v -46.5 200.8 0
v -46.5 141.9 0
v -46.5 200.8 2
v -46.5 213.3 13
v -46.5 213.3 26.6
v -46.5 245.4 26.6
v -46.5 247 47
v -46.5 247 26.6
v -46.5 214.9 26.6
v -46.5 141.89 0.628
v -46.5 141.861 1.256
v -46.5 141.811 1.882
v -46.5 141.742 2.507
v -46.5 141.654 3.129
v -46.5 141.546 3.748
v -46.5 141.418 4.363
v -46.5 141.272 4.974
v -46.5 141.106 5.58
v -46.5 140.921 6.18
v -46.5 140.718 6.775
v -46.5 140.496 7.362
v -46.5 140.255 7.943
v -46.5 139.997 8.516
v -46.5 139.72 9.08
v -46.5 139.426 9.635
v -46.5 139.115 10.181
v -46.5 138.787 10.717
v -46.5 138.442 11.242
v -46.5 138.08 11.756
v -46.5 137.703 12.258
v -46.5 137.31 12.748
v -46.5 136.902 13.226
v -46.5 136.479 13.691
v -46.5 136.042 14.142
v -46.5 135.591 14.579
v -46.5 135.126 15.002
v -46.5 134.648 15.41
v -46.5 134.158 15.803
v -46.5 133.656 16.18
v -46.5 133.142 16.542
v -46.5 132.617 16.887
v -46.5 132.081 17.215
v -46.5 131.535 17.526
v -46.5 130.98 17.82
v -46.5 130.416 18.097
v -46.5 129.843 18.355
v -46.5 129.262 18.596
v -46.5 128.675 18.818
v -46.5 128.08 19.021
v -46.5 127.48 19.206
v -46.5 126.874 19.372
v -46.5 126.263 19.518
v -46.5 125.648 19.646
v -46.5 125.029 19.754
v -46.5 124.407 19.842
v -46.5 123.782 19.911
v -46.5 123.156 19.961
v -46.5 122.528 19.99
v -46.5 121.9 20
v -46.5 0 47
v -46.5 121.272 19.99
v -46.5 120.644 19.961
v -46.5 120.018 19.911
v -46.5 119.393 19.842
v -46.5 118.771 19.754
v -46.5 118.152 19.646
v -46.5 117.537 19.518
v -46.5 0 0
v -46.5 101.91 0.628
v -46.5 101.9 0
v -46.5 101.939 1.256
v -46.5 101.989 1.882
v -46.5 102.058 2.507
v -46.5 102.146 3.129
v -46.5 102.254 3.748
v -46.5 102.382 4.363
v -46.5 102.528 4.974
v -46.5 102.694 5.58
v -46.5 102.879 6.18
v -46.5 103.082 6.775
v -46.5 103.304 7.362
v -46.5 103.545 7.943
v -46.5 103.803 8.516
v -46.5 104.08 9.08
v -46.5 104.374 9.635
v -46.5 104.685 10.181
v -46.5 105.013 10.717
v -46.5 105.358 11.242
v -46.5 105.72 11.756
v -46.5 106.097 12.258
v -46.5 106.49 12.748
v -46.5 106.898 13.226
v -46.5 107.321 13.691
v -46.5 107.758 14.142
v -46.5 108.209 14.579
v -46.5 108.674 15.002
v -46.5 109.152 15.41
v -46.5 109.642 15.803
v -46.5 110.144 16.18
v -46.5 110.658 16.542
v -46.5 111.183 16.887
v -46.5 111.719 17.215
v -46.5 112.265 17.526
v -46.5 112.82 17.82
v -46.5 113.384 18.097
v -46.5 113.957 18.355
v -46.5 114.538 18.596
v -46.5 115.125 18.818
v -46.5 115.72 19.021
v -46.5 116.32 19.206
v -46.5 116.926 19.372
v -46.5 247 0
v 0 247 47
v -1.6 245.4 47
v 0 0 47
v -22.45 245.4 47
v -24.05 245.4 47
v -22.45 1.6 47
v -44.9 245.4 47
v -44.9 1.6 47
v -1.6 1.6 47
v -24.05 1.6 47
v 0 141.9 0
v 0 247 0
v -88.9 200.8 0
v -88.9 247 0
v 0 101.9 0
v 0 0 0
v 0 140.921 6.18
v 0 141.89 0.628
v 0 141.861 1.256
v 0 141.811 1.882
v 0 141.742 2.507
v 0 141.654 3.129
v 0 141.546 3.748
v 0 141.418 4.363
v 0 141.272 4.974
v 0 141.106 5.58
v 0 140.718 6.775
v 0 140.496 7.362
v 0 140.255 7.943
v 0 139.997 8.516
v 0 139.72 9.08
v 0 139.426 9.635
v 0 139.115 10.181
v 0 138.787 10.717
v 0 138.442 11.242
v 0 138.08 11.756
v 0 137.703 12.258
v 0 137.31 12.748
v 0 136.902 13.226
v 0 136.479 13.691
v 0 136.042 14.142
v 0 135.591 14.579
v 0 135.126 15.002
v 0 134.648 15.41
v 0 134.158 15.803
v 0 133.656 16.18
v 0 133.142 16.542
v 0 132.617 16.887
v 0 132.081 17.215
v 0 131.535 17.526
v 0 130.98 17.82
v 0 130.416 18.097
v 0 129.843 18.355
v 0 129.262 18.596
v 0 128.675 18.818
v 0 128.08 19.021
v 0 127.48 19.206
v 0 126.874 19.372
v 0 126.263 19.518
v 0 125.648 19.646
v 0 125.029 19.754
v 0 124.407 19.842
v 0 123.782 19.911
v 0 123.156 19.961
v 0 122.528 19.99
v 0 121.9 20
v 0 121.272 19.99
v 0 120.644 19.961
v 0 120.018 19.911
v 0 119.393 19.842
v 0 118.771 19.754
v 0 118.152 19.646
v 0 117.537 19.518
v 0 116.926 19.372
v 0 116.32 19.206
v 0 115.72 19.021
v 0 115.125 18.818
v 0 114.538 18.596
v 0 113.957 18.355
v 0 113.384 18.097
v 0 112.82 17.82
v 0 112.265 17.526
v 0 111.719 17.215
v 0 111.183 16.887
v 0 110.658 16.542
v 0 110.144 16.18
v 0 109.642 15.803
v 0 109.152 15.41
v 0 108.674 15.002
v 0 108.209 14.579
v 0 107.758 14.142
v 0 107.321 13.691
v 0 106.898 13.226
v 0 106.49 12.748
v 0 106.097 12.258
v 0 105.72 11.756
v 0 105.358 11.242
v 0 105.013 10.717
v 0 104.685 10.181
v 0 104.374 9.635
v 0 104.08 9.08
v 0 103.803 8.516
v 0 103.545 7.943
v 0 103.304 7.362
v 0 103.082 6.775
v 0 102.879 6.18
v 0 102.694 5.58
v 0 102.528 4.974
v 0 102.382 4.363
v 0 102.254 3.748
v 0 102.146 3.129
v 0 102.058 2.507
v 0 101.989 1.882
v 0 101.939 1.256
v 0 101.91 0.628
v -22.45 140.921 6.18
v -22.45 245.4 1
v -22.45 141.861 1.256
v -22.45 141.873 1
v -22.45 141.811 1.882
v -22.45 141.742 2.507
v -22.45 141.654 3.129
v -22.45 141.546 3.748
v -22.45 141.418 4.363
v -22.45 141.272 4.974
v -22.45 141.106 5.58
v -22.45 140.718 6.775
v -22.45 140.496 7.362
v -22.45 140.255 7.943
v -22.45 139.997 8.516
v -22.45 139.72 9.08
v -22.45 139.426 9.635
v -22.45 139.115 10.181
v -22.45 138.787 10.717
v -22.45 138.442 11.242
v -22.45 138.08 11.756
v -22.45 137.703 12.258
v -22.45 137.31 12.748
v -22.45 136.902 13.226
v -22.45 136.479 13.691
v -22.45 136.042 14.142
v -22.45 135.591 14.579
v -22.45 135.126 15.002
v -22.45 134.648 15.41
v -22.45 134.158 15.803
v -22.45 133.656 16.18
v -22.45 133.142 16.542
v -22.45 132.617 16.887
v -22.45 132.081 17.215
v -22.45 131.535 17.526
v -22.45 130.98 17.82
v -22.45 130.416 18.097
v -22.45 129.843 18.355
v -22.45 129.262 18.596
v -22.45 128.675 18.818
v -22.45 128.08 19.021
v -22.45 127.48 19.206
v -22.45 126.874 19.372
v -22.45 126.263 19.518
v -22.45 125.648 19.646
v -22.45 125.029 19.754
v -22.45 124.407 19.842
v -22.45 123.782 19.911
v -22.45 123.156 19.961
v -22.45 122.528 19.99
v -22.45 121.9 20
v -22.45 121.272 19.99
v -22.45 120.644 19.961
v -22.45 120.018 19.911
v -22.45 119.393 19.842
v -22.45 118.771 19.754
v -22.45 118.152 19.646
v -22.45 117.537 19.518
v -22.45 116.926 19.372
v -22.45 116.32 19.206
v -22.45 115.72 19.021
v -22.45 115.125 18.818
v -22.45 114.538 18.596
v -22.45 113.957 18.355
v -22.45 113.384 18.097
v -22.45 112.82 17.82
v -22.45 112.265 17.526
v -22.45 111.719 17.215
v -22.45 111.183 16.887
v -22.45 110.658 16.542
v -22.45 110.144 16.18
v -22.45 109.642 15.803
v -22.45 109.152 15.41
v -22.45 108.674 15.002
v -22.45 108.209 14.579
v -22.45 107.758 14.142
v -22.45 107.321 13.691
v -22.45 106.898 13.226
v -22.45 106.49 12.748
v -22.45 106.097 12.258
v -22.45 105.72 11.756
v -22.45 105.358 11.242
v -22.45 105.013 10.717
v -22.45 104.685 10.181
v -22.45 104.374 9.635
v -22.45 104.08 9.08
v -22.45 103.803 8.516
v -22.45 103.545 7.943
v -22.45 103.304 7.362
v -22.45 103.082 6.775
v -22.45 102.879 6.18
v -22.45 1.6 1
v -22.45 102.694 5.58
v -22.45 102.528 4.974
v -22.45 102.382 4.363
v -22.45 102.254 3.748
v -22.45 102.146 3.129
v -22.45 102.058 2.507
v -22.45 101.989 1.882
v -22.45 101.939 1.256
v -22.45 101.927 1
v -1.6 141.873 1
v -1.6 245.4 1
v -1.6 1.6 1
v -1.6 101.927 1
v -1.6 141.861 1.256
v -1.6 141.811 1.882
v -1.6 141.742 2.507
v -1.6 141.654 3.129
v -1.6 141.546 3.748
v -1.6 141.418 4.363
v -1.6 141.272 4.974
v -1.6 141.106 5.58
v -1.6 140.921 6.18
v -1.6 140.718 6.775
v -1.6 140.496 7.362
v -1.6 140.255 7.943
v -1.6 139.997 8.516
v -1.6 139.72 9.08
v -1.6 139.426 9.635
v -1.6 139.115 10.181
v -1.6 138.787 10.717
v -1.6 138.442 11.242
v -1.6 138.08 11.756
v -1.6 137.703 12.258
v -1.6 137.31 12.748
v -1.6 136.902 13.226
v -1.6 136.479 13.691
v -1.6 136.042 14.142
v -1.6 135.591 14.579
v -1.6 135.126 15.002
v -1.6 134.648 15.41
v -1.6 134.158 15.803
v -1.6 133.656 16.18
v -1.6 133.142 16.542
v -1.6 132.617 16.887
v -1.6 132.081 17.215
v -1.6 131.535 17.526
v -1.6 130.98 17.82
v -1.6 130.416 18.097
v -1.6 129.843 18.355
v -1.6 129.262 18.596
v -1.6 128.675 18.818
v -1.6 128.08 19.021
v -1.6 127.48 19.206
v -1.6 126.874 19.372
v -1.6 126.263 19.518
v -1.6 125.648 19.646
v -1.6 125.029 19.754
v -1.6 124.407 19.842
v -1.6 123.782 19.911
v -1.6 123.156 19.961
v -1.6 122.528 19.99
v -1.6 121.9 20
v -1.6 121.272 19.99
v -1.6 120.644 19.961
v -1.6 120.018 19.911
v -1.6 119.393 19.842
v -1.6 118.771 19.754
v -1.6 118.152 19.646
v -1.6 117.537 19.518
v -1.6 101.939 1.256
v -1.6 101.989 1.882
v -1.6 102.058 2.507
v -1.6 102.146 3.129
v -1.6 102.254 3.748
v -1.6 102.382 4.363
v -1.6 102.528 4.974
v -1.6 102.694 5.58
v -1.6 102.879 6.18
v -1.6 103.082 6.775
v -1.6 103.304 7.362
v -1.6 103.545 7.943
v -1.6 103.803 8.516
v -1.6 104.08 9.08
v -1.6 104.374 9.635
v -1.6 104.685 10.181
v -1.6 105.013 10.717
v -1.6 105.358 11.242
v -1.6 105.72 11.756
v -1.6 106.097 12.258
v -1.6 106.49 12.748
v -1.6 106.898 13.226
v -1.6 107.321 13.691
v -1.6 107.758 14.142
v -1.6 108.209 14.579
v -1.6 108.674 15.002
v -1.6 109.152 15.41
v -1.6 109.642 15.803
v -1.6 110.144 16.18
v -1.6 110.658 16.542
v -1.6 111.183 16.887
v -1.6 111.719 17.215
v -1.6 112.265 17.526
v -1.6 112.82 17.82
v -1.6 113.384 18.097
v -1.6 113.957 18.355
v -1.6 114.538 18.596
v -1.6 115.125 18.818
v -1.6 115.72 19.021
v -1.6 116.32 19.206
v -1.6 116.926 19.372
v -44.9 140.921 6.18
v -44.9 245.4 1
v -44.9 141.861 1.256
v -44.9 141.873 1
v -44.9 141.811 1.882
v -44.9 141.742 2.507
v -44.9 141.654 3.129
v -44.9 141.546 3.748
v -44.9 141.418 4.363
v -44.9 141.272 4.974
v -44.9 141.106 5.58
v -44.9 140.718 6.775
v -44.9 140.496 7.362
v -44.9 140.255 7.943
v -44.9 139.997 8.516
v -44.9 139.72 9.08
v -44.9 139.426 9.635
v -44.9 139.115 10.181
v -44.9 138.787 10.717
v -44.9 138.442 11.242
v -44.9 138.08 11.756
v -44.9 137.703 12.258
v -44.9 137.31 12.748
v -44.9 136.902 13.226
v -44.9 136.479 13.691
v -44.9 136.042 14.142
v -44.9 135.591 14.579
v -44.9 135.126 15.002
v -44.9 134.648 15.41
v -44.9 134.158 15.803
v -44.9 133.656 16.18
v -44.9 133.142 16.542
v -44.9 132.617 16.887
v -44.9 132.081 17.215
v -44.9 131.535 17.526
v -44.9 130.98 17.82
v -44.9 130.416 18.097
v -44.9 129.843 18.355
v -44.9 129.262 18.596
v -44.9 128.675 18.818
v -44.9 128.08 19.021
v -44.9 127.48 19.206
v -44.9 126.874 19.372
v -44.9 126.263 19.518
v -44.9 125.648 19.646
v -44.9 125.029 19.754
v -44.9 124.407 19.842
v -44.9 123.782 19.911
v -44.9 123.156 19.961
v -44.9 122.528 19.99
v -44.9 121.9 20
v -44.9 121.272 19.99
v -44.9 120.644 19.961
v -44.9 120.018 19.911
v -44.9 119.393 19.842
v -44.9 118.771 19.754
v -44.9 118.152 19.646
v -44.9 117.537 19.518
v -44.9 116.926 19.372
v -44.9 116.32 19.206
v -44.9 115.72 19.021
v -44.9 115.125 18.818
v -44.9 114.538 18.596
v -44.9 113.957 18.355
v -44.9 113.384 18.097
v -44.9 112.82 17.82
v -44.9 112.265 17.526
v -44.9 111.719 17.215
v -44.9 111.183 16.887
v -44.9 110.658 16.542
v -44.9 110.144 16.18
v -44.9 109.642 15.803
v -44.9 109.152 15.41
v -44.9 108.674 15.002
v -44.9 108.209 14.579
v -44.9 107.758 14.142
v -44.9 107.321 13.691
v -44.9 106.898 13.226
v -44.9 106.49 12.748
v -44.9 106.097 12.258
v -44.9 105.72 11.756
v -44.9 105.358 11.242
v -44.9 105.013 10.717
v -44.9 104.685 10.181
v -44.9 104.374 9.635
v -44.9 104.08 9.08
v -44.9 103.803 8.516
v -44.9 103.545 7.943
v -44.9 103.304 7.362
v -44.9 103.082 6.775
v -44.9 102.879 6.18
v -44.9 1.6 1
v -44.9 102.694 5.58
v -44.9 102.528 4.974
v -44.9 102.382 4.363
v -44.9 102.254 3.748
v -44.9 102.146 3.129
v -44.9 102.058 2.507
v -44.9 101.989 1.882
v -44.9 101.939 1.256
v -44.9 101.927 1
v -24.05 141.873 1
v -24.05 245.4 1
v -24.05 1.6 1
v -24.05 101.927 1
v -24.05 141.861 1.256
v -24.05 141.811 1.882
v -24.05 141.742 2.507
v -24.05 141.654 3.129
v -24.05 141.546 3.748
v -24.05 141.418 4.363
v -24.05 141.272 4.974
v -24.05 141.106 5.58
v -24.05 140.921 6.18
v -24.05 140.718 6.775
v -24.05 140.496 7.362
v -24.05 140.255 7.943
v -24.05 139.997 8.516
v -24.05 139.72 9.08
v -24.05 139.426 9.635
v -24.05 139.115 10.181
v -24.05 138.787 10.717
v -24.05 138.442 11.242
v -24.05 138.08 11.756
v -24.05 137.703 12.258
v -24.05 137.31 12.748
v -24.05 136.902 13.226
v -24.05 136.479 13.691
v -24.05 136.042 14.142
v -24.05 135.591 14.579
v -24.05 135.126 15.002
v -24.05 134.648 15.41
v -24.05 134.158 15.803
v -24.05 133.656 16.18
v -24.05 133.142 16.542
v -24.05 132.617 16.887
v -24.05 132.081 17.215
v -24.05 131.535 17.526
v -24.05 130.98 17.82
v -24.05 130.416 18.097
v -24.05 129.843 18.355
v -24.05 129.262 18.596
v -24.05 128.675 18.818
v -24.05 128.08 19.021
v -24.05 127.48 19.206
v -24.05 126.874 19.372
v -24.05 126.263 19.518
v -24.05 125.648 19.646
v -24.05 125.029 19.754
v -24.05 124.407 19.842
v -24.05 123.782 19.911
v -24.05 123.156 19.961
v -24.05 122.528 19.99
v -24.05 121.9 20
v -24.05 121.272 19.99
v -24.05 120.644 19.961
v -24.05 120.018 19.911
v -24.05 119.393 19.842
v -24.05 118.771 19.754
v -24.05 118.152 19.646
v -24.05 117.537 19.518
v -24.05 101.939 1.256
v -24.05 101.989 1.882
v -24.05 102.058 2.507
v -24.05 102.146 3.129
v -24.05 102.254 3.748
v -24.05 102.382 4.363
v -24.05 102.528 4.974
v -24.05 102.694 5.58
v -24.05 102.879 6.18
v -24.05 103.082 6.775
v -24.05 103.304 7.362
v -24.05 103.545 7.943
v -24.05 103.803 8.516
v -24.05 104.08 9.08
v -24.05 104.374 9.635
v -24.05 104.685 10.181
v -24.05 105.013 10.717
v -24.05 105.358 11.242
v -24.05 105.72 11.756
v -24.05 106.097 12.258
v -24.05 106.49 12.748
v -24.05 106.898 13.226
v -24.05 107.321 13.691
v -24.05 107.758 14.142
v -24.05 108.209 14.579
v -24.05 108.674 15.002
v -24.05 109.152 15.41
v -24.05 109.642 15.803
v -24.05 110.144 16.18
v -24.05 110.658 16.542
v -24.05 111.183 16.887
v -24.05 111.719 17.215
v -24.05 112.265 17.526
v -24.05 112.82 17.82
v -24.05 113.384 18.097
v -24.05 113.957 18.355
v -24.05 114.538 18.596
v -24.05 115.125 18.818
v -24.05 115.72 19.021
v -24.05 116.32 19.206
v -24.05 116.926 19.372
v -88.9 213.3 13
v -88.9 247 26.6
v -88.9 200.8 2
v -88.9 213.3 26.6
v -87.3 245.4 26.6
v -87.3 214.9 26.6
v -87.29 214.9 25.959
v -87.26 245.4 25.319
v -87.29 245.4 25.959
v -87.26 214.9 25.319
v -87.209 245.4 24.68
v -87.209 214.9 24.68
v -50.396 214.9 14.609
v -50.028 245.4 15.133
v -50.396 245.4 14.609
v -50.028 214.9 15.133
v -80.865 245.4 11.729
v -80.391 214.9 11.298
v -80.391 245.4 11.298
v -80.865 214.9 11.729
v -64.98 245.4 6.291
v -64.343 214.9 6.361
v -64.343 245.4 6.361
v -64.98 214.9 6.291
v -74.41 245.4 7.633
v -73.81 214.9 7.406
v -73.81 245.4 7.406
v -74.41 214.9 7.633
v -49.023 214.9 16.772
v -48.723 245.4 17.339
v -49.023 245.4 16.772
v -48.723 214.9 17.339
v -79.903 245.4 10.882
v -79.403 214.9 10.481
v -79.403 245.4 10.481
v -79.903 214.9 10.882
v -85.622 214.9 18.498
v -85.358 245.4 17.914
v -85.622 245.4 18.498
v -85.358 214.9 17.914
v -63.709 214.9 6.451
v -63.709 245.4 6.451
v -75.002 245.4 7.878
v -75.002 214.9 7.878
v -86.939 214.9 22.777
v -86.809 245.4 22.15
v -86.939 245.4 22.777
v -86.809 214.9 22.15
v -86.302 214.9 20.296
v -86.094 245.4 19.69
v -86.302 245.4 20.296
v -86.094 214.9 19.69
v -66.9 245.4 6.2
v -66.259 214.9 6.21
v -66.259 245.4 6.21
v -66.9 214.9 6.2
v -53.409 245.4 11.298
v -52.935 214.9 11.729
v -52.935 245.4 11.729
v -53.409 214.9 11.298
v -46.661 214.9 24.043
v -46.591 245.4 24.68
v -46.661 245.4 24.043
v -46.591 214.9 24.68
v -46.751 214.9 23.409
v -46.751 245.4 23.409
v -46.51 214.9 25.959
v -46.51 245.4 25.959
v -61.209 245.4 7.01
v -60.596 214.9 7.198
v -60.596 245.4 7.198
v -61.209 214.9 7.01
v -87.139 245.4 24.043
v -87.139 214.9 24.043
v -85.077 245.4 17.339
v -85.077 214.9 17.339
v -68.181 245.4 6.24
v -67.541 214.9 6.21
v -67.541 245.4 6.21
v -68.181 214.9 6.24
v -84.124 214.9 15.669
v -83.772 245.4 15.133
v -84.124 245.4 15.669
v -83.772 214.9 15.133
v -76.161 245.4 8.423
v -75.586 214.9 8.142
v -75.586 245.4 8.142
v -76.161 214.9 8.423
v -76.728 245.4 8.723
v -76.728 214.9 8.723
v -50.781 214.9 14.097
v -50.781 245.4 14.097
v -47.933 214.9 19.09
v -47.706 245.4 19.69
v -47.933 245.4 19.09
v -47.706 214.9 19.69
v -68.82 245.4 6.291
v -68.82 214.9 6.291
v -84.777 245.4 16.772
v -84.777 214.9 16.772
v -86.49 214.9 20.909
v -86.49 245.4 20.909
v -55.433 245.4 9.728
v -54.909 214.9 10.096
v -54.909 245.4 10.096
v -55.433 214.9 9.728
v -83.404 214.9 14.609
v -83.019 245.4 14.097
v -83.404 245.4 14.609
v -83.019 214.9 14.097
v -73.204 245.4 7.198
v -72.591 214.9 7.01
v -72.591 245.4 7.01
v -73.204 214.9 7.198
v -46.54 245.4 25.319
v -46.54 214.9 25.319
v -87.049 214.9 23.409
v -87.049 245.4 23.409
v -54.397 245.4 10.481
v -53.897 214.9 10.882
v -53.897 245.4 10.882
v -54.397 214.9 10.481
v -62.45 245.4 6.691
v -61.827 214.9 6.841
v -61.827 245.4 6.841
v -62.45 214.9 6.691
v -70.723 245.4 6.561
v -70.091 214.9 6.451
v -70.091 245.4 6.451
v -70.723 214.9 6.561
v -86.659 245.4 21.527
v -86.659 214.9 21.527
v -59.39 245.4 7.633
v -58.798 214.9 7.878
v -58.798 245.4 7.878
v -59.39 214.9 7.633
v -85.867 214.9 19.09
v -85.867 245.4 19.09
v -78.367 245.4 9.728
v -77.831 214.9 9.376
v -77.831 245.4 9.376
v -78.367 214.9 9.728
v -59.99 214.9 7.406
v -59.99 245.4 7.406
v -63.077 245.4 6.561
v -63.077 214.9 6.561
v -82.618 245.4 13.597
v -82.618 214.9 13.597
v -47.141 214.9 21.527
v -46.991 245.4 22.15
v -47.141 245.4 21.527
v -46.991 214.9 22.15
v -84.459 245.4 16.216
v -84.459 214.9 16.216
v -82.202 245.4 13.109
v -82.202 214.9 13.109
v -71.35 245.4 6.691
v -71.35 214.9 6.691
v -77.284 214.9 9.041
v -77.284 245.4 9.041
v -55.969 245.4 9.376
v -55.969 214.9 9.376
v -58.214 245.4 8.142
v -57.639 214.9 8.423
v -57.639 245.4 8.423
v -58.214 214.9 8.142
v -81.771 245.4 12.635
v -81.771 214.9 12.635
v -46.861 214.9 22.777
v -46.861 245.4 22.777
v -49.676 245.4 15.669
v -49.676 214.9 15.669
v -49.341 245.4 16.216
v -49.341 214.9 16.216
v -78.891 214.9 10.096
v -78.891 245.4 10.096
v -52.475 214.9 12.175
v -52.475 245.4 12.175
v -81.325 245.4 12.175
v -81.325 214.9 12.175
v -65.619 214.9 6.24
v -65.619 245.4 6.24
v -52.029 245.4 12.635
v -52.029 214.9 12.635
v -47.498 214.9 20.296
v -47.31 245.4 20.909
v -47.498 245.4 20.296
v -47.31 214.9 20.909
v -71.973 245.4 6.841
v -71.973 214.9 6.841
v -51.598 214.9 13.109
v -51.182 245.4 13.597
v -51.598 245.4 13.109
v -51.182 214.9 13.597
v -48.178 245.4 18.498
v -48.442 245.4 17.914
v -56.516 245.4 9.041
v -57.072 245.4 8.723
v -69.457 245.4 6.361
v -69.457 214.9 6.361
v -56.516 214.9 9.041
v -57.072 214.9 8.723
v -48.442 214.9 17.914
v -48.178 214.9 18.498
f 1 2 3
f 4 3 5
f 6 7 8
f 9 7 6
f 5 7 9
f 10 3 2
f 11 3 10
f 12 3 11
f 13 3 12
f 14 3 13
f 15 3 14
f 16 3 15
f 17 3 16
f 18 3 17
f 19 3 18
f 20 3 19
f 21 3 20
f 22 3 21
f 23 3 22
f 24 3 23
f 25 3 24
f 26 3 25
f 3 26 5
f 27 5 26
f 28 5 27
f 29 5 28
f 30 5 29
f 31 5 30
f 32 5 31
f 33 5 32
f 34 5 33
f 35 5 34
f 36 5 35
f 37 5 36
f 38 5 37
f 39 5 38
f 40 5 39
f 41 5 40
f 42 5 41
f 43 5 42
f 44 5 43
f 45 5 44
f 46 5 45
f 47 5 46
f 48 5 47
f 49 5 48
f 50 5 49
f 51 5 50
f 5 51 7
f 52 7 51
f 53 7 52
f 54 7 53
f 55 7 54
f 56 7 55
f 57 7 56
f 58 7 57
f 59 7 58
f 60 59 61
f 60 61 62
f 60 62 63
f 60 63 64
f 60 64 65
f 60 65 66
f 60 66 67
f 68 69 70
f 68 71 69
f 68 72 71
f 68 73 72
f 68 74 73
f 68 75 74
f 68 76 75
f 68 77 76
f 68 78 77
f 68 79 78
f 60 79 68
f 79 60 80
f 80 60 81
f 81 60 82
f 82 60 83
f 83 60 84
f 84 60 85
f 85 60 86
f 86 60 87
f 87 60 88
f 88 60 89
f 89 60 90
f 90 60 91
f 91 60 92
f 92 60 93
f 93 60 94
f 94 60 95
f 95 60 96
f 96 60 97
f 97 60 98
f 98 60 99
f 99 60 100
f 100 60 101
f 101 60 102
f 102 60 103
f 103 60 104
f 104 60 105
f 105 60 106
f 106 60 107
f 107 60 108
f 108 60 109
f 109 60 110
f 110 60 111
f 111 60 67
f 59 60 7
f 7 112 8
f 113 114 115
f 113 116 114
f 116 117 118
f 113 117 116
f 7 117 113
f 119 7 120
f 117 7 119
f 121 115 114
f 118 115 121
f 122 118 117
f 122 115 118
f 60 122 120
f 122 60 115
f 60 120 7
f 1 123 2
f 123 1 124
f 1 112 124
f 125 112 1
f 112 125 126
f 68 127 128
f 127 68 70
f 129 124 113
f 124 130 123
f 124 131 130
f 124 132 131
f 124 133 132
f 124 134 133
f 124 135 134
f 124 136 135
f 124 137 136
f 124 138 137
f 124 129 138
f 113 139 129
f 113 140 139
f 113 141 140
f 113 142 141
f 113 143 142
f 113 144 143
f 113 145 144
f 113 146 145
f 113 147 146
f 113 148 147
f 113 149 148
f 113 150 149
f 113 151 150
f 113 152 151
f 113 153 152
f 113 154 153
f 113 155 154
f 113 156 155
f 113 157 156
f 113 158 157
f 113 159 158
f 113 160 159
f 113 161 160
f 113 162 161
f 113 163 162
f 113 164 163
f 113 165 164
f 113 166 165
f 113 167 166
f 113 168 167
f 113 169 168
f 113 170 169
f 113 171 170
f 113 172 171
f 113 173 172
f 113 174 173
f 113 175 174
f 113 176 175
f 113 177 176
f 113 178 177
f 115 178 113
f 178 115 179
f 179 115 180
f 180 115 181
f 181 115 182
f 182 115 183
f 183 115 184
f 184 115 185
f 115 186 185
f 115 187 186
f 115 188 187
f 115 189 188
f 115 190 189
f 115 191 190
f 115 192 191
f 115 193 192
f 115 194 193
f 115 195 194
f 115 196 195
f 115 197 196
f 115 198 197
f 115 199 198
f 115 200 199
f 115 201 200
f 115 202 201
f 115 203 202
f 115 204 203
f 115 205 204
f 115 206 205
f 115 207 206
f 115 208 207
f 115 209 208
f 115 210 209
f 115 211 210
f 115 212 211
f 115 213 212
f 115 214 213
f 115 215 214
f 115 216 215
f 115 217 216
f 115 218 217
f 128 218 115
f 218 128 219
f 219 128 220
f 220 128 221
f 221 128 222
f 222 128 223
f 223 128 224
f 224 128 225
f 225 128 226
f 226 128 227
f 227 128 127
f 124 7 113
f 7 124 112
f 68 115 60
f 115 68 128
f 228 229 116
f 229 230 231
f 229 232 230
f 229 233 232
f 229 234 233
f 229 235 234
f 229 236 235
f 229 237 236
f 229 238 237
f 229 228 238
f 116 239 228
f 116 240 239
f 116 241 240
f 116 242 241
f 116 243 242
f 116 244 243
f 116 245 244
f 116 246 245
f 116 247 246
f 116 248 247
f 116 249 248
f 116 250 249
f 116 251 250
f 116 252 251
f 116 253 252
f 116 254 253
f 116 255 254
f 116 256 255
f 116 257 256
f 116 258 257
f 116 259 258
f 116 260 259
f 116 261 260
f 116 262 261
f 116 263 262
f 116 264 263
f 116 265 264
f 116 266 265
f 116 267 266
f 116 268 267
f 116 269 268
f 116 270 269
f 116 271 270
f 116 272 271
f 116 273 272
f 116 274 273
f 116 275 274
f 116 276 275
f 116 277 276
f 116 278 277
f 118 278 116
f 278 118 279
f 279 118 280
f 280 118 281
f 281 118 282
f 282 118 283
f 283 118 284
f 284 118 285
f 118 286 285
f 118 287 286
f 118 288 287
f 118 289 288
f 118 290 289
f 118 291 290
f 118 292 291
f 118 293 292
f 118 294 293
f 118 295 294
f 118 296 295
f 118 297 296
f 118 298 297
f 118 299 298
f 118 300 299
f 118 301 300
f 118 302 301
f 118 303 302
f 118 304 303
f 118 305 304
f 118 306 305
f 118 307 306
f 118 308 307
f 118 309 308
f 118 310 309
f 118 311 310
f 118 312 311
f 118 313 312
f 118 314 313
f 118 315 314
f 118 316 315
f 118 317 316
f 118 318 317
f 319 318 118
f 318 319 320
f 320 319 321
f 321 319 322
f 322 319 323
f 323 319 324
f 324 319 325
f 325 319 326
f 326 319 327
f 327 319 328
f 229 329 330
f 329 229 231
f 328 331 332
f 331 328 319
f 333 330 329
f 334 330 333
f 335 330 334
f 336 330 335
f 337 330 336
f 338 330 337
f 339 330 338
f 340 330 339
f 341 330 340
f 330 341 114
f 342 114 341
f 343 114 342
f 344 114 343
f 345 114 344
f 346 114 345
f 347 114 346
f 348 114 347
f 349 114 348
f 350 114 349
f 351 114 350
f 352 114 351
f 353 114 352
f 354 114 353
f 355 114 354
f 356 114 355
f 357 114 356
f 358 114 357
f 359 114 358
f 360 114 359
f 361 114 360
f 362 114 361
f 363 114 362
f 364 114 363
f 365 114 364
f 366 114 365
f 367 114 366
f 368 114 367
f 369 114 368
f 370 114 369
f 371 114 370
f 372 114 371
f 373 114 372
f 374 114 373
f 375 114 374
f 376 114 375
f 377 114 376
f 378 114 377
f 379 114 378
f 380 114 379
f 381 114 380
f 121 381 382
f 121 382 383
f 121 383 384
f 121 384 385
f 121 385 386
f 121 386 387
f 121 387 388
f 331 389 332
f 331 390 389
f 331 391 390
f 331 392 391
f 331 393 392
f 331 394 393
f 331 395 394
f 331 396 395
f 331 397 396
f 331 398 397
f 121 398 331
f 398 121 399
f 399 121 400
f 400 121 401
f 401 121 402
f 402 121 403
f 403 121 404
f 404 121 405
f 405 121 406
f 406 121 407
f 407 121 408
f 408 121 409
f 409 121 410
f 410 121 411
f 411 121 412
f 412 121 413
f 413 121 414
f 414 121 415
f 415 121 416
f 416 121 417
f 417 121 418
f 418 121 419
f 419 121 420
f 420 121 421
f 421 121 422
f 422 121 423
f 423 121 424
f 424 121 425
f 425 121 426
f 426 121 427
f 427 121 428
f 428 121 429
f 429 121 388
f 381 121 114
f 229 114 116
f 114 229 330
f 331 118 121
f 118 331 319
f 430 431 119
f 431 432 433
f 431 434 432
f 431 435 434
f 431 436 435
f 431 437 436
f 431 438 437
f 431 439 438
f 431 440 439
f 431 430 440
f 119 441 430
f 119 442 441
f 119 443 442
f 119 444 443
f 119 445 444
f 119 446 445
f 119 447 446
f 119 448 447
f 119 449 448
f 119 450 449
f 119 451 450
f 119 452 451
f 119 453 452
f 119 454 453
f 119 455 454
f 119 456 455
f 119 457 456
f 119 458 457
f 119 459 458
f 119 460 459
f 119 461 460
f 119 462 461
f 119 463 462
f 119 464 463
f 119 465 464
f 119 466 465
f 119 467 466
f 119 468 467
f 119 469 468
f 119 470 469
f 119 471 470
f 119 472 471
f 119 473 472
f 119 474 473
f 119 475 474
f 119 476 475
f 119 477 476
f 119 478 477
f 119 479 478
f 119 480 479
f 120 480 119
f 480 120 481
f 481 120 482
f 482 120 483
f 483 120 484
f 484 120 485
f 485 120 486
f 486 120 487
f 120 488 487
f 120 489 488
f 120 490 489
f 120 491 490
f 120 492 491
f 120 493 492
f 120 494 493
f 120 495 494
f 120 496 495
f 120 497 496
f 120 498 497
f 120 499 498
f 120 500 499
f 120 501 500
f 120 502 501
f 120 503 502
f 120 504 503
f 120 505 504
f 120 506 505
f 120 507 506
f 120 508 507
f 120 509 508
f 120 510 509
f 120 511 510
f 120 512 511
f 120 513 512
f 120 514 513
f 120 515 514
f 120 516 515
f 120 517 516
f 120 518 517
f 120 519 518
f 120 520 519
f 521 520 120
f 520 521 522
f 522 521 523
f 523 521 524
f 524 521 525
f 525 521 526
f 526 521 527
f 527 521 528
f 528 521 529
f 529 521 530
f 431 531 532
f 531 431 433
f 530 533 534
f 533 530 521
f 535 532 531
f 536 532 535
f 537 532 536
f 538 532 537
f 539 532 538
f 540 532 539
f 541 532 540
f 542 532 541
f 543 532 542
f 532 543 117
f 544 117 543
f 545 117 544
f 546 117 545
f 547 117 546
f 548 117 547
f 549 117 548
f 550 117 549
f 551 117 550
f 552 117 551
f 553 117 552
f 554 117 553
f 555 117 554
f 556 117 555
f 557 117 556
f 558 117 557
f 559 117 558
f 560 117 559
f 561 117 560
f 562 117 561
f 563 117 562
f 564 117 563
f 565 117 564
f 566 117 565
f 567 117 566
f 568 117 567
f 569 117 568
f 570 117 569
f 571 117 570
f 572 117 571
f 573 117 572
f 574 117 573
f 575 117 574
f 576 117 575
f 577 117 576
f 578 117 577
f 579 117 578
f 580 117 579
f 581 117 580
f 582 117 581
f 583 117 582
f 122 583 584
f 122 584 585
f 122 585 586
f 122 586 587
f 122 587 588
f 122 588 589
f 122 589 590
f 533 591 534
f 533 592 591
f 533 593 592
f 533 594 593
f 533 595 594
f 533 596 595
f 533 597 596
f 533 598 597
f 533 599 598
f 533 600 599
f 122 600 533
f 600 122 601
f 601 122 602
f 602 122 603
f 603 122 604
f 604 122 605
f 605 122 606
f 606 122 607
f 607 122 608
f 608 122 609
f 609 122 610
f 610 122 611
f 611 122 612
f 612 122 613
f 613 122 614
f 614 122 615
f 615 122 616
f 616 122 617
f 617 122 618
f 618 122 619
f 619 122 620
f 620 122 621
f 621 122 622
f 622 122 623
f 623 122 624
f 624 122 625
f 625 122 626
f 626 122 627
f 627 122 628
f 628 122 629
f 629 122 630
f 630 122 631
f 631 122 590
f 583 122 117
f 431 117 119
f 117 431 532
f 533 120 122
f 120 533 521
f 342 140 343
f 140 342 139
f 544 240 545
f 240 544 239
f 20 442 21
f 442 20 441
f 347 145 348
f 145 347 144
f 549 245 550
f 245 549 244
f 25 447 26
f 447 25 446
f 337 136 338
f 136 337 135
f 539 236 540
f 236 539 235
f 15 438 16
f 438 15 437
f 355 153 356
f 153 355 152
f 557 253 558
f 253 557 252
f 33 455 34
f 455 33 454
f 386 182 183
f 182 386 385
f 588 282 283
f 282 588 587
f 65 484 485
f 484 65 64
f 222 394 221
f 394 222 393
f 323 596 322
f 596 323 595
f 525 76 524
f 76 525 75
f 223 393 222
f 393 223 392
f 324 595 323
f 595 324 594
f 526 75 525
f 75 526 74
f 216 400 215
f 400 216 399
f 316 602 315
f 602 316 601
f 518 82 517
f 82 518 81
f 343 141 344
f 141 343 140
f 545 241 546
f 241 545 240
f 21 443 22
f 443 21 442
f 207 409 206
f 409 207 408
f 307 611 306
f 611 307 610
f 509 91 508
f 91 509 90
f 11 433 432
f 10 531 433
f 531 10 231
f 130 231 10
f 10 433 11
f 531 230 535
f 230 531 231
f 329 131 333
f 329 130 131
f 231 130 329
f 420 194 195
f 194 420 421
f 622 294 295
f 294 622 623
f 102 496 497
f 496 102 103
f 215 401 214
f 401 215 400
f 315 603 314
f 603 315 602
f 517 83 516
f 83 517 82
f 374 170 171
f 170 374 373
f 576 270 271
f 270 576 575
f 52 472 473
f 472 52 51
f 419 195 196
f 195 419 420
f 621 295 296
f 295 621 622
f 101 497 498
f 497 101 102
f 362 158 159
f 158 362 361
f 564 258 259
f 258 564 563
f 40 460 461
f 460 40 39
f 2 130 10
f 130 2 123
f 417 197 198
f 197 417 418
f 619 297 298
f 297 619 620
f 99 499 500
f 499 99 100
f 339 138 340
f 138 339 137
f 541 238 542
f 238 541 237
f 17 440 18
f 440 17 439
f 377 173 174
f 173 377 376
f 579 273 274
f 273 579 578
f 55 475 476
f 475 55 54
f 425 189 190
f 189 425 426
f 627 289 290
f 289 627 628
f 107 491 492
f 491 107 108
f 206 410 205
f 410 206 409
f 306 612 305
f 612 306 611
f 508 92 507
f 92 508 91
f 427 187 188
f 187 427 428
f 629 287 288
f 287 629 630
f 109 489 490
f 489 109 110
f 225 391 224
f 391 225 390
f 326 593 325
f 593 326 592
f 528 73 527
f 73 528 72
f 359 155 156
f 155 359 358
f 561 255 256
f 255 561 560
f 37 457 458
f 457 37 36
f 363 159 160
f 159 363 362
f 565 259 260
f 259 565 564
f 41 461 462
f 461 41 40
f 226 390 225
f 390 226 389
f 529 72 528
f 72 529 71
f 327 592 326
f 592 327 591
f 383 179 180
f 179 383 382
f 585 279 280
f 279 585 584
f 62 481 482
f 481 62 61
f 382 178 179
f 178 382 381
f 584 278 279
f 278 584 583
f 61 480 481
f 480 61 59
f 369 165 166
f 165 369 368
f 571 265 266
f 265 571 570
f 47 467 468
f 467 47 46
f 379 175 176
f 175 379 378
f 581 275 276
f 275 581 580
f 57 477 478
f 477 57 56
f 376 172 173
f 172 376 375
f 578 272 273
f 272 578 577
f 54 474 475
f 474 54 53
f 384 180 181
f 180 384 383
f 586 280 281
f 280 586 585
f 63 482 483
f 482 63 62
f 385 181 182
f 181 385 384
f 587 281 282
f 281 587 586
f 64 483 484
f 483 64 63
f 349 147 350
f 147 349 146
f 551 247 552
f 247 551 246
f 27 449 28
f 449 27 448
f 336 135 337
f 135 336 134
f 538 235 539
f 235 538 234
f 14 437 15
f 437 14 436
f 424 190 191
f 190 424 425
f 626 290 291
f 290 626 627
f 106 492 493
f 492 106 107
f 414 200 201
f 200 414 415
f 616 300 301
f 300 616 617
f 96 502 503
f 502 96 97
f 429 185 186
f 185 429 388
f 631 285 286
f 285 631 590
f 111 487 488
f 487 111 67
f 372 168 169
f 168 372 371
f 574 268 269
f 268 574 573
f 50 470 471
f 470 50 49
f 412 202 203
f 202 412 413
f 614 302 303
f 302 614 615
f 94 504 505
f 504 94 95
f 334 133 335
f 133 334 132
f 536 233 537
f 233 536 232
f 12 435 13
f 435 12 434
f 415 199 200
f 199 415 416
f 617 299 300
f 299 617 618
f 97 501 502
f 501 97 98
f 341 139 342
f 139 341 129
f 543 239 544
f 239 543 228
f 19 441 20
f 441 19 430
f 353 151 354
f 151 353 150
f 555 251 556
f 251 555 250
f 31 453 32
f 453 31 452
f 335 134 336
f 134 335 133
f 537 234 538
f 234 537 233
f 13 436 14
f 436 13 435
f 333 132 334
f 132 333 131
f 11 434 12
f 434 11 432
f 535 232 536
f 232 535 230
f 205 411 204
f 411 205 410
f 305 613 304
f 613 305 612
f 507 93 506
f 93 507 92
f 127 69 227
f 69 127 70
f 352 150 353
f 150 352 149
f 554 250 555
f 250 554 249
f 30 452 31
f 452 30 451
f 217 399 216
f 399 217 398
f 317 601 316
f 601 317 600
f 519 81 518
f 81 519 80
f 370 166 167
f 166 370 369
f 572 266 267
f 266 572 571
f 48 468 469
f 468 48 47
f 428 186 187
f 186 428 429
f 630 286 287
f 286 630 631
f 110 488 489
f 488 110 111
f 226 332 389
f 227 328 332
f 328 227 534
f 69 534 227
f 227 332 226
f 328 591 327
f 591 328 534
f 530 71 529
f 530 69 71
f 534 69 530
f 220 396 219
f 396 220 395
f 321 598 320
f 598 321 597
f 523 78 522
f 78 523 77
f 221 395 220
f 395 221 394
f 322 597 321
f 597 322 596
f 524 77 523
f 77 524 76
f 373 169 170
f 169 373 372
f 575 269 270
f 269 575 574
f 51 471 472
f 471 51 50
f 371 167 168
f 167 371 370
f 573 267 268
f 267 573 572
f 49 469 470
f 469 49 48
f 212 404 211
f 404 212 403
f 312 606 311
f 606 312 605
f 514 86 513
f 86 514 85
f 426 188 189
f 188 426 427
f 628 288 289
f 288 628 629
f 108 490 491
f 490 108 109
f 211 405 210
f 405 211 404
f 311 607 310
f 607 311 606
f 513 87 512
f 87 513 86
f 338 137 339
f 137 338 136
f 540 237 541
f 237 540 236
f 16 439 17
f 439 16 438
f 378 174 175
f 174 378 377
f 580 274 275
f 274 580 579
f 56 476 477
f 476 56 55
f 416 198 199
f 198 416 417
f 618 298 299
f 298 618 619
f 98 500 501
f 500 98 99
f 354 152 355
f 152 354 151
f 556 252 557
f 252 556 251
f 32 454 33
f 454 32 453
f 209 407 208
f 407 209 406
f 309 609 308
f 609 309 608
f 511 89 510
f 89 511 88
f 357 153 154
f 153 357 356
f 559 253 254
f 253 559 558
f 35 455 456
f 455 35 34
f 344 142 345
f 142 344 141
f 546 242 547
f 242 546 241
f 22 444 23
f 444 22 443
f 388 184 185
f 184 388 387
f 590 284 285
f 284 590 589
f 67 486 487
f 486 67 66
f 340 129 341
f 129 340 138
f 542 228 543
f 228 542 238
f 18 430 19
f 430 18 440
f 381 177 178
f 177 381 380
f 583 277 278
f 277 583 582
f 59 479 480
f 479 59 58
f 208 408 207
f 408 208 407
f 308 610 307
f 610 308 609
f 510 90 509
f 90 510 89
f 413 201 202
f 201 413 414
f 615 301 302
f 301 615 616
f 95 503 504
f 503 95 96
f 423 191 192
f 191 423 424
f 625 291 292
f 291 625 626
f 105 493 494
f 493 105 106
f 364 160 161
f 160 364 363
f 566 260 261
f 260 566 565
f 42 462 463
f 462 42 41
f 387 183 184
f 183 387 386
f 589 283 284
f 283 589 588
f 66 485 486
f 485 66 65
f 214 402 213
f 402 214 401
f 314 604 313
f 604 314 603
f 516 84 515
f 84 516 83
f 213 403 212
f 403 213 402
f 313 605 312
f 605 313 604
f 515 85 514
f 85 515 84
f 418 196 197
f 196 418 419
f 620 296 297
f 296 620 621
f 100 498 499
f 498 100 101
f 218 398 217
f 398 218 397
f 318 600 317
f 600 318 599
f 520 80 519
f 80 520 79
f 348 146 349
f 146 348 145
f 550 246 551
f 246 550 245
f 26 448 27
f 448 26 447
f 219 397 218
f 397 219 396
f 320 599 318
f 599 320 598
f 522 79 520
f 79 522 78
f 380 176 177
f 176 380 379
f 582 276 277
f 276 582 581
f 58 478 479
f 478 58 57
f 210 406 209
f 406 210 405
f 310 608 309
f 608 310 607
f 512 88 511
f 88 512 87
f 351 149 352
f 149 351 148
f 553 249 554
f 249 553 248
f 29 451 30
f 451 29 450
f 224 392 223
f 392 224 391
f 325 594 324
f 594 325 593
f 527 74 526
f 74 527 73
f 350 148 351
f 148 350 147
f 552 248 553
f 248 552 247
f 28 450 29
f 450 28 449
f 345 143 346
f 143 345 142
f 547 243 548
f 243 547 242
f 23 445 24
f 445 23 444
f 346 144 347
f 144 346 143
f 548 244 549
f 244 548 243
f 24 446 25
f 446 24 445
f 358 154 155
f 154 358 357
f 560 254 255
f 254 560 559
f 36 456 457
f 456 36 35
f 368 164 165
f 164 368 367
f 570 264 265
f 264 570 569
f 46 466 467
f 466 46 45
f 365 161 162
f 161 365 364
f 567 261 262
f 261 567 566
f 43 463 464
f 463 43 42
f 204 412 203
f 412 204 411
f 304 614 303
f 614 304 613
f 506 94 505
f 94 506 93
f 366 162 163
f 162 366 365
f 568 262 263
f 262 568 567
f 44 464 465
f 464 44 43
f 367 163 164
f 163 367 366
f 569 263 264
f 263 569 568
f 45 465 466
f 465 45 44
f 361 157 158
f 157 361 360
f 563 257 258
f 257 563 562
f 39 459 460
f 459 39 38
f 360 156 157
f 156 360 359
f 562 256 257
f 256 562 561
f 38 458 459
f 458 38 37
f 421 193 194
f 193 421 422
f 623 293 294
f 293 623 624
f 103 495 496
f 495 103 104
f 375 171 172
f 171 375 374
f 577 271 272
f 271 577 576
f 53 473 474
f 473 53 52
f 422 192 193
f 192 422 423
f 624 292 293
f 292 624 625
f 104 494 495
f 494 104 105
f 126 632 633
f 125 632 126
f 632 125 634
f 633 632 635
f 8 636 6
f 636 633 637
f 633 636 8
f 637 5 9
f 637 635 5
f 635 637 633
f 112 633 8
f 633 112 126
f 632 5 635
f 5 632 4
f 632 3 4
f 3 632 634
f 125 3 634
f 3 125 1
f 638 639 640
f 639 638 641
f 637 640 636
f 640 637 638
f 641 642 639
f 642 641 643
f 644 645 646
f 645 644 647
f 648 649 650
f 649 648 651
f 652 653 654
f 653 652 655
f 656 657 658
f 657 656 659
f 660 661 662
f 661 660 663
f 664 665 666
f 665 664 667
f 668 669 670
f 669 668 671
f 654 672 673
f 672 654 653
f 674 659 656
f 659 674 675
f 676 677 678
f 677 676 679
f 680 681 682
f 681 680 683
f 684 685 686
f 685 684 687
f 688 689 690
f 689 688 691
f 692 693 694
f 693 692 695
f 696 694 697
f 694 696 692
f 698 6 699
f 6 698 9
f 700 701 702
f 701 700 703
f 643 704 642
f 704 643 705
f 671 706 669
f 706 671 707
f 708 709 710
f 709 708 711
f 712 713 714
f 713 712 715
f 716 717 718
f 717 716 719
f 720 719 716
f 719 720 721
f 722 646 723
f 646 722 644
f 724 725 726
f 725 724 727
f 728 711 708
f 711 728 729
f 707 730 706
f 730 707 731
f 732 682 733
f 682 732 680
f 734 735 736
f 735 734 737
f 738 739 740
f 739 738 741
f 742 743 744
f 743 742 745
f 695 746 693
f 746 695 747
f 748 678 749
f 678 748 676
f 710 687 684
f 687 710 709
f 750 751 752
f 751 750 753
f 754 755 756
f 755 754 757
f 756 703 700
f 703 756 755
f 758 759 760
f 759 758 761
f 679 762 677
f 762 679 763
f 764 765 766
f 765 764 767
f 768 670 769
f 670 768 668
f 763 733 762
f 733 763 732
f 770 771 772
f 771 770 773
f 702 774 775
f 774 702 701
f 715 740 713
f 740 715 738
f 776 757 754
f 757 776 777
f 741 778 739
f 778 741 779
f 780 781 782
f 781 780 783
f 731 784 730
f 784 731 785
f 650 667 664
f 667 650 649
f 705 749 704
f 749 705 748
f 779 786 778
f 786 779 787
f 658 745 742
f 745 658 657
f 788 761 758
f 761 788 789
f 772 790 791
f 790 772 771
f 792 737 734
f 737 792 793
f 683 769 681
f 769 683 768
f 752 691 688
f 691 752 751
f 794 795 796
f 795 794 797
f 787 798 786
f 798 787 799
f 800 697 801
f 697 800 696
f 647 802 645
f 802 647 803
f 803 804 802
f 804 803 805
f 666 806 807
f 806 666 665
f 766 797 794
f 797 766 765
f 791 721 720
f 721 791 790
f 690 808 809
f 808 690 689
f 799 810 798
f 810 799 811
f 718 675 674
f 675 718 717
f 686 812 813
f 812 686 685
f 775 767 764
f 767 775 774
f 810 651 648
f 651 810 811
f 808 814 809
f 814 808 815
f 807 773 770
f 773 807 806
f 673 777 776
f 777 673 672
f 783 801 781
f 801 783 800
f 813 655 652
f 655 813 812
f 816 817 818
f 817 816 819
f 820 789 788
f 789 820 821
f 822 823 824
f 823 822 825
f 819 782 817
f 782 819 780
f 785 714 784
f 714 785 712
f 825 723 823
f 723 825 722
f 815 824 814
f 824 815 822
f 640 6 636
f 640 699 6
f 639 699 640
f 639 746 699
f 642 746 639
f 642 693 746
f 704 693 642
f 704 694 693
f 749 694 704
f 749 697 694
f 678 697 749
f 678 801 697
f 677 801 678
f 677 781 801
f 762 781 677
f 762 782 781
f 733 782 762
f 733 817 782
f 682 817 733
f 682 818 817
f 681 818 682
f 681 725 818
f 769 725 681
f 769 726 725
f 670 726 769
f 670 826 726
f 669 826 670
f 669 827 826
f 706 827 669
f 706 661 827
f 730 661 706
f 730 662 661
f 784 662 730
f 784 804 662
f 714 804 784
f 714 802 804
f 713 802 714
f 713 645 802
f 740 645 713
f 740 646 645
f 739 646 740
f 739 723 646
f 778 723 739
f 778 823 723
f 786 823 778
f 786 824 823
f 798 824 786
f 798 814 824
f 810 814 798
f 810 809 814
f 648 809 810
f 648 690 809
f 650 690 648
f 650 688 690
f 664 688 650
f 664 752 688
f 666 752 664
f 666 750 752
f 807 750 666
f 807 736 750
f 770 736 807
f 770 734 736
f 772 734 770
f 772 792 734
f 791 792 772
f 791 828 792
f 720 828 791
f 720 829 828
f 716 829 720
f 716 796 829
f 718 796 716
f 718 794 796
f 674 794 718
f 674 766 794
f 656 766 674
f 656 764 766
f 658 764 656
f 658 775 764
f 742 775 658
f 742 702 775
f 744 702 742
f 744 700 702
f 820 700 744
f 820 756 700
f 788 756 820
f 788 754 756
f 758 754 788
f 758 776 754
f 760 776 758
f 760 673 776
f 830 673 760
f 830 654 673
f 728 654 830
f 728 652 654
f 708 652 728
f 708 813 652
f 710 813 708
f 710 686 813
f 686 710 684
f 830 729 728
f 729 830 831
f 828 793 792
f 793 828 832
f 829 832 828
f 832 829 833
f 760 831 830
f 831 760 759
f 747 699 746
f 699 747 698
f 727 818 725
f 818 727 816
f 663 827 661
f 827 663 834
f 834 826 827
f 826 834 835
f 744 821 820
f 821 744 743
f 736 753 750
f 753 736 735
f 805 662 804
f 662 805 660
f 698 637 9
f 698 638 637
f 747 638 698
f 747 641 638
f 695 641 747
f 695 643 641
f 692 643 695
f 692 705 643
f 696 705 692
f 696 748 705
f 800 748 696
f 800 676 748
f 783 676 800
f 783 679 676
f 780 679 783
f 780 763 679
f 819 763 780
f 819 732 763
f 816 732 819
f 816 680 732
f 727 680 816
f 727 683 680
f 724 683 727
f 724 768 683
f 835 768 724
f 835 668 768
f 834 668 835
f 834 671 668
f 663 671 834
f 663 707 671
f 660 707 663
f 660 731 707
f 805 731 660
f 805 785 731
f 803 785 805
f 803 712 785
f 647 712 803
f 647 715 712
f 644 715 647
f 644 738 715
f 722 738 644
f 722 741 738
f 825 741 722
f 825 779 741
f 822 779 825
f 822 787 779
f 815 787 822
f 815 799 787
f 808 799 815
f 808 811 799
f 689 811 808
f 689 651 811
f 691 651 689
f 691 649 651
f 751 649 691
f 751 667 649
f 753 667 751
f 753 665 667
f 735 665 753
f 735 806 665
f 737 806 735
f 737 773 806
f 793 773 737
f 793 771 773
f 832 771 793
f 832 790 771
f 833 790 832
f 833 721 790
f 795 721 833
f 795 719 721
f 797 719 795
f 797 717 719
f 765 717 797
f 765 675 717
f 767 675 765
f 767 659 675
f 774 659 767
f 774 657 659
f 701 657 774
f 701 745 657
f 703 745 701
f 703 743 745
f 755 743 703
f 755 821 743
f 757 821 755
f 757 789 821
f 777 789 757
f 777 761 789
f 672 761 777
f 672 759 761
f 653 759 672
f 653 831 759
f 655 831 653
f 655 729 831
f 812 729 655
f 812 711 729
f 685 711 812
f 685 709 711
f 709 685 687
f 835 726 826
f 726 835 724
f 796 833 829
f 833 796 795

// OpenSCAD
$fn=200;

x=296;
px=202;
z=47;

w=1.6;

cardy=49;


xd=(x-px-1)/2;
yd=x-cardy;

r=40.8/2;

module dresser() {
    union() {
        difference() {
            cube([xd,yd,z]);
            translate([w,w,1]) cube([(xd-3*w)/2,yd-2*w,z]);
            translate([w+(xd-3*w)/2+w,w,1]) cube([(xd-3*w)/2,yd-2*w,z]);
            translate(v = [-1,(yd-2*w)/2,0]) rotate([0,90,0]) cylinder(r=20,h=50);
        }
        translate([xd,yd-(w+30.5+w),0]) difference() {
            union() {
                cube([r*2+w,w+30.5+w,z-r]);
                hull() {
                    translate([0,30.5-43,0]) cube([r*2+w,43,2]);
                    cube([r*2+w,30.5,13]);
                }
            }
            translate([r,w,z-r]) rotate([-90,0,0]) cylinder(h=30.5, r=r);
        }
    }
}
mirror([1,0,0]) dresser();


dt1=63;
dt2=84;
dto=yd-2*w-0.4-(w+dt1+w+dt2+w)-w;
module drawer_tiles() {
    difference() {
        cube_rounded([z-1-0.4,yd-2*w-0.4,(xd-3*w)/2-0.4]);
        translate([w,w,1]) cube_rounded2([(z-1-0.4)-2*w,dt1,100]);
        translate([w,w+dt1+w,1]) cube_rounded2([(z-1-0.4)-2*w,dt2,100]);
        translate([w,w+dt1+w+dt2+w,1]) cube_rounded2([(z-1-0.4)-2*w,dto,100]);
        // test
        translate([0,30,0]) sphere(r = 10);
        translate([0,yd-2*w-30,0]) sphere(r = 10);
        translate([0,(yd-2*w)/2,0]) sphere(r = 10);
    }
}
// drawer_tiles();

module cube_rounded2(v, r=10, center=false){
    translate([0,v[1],0]) rotate([90,0,0]) cube_rounded([v[0],v[2],v[1]], r = r);
}

module cube_rounded(v, r=2, center=false){
    translate(center==true ? [r-v[0]/2,r-v[1]/2,-v[2]/2] : [r,r,0])
    union(){
        cylinder(h = v[2], r = r);
        translate(v = [0,v[1]-2*r,0]) cylinder(h = v[2], r = r);
        translate(v = [v[0]-2*r,v[1]-2*r,0]) cylinder(h = v[2], r = r);
        translate(v = [v[0]-2*r,0,0]) cylinder(h = v[2], r = r);
        translate(v = [-r,0,0]) cube([v[0],v[1]-2*r,v[2]]);
        translate(v = [0,-r,0]) cube([v[0]-2*r,v[1],v[2]]);
    }
}
